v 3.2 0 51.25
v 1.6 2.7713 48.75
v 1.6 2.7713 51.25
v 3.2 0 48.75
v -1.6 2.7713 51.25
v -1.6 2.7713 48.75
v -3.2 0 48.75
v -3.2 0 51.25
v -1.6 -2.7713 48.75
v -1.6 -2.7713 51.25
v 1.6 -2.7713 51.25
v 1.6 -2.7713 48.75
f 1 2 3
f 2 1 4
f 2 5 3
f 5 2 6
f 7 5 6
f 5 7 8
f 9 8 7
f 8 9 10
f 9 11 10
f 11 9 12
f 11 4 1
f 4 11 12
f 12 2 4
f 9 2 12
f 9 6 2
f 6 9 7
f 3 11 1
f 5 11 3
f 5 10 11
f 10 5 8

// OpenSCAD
translate([0,0,50])
cylinder(d = 6.40, h=2.5, center=true, $fn=6);
